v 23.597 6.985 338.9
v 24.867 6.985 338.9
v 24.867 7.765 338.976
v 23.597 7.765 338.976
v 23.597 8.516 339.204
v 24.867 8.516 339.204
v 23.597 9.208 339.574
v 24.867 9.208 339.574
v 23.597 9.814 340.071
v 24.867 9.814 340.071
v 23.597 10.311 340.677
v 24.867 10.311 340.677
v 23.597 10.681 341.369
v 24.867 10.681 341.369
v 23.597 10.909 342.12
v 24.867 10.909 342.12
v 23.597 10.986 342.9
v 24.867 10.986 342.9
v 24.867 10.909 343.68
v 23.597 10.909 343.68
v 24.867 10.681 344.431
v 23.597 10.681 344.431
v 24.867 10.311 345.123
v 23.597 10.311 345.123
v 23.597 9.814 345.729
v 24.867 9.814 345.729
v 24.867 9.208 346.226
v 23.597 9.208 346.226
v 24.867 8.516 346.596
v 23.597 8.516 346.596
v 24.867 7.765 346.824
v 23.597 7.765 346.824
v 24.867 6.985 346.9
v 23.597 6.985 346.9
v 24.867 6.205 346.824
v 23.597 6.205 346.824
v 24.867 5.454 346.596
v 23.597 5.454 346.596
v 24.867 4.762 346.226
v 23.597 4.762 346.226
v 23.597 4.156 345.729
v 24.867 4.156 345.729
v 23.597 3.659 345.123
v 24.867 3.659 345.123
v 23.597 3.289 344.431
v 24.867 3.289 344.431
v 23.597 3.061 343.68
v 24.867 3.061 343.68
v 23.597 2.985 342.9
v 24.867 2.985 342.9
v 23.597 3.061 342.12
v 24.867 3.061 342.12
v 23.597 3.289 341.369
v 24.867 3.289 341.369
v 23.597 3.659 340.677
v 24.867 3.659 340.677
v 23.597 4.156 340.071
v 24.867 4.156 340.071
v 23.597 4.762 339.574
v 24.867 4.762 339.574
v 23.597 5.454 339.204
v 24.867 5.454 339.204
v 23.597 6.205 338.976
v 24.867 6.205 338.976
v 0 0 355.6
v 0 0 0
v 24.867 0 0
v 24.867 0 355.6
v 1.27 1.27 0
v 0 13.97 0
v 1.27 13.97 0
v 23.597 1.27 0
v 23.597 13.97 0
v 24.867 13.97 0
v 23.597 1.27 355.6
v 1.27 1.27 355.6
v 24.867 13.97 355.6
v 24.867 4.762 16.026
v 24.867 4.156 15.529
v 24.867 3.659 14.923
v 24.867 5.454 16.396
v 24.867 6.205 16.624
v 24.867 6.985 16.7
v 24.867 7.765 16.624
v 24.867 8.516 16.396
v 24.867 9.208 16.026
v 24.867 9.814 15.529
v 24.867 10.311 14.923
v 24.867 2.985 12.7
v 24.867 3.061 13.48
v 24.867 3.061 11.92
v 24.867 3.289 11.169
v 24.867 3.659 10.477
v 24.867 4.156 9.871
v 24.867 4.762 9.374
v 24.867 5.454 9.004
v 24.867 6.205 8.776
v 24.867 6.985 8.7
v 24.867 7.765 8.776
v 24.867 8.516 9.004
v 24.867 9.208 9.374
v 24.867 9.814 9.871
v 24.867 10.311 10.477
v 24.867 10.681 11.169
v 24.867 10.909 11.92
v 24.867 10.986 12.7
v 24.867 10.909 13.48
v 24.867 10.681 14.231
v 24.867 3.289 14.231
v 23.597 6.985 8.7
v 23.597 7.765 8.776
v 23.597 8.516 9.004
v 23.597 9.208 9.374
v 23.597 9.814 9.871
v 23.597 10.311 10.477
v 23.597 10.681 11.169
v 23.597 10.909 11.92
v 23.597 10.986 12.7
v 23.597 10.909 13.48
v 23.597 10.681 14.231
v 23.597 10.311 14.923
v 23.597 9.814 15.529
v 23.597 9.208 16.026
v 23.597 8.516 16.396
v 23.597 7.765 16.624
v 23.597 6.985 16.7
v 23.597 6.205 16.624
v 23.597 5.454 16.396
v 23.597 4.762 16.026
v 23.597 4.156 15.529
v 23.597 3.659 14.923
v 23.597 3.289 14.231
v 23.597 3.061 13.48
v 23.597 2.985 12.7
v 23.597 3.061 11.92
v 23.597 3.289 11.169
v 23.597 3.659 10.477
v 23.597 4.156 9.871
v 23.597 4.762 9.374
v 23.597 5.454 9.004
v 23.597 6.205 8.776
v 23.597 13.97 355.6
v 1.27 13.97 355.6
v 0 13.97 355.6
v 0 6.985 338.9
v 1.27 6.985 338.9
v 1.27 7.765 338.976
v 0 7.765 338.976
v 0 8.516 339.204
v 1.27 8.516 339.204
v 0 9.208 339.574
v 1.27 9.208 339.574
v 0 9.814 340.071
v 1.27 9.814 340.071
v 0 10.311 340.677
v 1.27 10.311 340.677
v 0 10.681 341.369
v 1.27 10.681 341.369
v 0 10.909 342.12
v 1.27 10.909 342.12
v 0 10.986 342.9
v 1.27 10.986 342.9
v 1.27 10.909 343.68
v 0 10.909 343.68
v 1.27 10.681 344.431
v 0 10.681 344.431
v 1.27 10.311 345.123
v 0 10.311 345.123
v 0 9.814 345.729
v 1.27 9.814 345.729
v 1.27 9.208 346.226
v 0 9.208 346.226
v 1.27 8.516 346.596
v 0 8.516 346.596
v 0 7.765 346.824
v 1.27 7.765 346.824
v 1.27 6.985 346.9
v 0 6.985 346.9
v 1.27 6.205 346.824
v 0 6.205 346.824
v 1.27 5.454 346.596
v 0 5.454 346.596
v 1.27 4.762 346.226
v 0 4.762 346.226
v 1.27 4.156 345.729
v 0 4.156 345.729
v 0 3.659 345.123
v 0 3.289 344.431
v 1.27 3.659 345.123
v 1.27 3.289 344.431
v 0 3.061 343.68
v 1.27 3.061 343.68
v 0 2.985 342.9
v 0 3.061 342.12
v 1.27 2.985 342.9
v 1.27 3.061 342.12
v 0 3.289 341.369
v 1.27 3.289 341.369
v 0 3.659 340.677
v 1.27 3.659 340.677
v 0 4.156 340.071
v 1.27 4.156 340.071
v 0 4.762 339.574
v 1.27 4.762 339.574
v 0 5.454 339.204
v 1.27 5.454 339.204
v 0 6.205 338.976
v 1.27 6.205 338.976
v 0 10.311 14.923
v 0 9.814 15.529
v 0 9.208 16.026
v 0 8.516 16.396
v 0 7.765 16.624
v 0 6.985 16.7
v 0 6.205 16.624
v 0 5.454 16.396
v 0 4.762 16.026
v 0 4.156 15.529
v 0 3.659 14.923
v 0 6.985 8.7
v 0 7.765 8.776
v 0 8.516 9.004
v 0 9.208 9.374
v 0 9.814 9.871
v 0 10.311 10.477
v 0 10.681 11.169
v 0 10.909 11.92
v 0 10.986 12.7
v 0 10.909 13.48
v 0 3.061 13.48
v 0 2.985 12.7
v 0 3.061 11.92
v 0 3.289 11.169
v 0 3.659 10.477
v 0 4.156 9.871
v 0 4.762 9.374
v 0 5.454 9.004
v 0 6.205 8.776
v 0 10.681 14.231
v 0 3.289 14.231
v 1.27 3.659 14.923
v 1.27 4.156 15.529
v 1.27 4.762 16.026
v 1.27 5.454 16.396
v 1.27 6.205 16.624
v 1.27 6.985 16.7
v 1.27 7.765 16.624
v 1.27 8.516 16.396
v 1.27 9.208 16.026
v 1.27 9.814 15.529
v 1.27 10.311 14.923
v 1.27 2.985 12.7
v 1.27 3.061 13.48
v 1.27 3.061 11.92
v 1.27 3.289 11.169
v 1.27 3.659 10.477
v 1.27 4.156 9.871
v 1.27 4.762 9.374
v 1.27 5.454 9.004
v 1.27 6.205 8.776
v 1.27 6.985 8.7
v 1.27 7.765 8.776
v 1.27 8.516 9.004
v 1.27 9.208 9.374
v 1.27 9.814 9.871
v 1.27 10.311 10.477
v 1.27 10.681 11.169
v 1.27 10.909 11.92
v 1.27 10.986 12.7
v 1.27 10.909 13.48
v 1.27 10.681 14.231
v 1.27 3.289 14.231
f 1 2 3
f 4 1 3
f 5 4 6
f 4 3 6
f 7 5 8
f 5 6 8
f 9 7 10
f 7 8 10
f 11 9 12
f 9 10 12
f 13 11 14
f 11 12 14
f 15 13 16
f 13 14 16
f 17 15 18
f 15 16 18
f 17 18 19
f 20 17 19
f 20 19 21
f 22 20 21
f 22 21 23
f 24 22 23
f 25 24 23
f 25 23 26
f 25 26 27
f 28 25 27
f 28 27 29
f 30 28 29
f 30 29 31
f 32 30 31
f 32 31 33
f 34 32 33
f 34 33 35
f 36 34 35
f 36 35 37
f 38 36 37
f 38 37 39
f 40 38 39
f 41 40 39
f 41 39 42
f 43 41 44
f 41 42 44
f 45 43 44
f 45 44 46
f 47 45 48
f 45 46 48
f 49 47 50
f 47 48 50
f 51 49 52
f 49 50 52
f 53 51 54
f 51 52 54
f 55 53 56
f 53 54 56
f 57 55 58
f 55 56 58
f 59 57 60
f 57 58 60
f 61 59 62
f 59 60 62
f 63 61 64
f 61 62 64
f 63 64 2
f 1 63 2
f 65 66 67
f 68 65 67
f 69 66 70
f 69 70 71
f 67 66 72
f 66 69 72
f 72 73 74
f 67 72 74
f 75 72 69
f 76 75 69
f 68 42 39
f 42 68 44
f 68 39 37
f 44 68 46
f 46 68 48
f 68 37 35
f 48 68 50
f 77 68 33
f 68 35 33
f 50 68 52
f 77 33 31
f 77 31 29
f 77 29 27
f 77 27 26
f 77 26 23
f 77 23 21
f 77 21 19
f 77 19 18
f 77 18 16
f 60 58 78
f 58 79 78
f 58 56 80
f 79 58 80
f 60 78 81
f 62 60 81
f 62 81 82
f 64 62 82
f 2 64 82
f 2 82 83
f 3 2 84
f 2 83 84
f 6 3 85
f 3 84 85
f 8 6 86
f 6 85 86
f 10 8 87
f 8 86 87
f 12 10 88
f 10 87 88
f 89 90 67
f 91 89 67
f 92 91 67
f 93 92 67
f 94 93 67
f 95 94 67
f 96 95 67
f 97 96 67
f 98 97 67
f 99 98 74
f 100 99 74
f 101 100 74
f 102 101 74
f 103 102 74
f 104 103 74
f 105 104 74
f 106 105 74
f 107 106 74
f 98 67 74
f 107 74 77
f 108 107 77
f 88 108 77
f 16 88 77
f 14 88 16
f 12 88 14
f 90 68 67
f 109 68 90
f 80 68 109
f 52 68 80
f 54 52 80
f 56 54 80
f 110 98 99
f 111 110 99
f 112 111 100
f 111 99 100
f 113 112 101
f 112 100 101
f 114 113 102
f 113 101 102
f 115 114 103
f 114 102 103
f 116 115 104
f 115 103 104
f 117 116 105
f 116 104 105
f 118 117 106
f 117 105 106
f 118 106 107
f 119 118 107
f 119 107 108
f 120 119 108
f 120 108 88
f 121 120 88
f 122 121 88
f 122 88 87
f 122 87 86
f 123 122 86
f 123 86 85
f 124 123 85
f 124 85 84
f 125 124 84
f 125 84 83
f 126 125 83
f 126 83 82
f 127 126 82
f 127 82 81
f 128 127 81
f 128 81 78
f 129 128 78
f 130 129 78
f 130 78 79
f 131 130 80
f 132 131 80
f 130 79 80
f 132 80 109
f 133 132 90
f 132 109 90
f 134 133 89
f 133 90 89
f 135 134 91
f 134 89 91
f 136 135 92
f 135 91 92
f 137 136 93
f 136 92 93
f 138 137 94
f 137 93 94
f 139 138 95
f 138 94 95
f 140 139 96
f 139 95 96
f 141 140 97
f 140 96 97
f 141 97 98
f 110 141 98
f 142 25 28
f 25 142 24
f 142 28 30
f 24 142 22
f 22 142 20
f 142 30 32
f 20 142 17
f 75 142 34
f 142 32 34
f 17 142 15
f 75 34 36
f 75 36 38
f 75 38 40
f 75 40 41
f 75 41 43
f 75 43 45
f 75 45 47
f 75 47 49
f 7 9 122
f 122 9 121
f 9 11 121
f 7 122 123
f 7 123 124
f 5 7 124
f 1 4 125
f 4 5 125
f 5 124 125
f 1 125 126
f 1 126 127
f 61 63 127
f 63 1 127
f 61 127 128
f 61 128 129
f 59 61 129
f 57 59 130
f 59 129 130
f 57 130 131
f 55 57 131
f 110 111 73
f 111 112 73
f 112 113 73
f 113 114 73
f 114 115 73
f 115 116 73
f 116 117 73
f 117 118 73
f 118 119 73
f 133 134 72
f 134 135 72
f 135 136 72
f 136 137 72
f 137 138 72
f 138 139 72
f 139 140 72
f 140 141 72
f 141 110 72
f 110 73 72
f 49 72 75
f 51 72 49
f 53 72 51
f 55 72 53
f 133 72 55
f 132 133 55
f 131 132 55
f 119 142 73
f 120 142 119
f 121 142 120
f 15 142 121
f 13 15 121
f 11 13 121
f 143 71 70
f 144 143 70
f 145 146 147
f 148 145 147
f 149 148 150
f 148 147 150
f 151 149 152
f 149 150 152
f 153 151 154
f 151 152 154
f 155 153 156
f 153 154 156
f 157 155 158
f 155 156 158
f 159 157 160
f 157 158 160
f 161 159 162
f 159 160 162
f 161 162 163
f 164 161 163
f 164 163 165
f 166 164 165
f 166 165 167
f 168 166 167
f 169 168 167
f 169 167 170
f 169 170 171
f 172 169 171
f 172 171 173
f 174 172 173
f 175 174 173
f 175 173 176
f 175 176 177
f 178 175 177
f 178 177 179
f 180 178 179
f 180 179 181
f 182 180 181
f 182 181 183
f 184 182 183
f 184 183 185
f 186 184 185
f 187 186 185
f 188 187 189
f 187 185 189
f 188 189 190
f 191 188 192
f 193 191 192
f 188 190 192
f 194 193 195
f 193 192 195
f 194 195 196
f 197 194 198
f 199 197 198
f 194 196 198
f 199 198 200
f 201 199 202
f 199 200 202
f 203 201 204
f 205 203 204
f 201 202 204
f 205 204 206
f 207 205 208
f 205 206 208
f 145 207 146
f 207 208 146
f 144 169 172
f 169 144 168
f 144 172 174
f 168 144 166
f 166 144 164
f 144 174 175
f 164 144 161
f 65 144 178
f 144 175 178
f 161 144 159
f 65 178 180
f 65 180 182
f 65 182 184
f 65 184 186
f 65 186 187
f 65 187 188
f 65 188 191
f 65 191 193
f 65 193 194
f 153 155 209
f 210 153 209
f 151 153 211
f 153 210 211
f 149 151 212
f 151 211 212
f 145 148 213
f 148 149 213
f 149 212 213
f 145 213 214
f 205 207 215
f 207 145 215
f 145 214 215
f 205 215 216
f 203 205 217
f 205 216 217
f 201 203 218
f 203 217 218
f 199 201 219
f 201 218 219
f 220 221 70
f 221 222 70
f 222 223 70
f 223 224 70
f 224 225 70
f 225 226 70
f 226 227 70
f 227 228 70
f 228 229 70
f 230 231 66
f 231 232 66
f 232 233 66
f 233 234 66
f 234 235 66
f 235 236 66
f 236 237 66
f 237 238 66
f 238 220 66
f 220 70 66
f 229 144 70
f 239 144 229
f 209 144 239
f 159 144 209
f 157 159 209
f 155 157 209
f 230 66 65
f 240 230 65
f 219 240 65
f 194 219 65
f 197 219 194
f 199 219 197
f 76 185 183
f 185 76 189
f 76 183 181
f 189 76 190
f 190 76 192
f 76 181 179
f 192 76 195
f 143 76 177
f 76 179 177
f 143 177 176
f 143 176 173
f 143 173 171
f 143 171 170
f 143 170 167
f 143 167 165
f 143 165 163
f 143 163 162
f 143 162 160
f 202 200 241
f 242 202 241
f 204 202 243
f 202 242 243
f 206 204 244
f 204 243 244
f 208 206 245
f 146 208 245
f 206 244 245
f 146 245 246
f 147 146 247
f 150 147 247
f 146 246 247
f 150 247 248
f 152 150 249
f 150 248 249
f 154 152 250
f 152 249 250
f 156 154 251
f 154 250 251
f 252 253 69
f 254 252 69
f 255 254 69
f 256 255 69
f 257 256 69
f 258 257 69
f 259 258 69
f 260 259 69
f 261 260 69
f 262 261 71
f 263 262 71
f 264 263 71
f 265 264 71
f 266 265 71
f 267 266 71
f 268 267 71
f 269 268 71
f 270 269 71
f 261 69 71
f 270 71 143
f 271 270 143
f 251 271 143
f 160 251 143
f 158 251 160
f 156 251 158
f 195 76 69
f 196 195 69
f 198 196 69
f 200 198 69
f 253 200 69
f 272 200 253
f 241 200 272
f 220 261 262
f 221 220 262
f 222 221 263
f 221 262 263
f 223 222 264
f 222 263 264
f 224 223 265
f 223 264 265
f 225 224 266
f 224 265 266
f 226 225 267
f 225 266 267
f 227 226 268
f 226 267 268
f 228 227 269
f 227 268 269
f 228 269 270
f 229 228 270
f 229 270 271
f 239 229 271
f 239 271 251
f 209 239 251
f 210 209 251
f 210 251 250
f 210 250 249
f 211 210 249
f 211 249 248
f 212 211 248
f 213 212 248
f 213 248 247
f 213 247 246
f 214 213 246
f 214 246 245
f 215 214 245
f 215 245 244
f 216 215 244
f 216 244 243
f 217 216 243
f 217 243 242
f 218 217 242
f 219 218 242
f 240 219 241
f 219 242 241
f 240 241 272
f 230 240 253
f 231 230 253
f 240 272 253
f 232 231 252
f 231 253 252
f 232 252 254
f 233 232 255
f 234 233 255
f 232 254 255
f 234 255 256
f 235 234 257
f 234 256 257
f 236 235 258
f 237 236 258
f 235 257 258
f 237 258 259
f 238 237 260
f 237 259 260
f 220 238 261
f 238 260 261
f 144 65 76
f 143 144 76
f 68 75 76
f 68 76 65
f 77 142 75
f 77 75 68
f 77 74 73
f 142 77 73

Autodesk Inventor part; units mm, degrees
ref_plane "YZ Plane" through (0, 0, 0) normal (1, 0, 0) x (0, 1, 0)
ref_plane "XZ Plane" through (0, 0, 0) normal (0, 1, 0) x (-1, 0, 0)
ref_plane "XY Plane" through (0, 0, 0) normal (0, 0, 1) x (1, 0, 0)
sketch "Sketch1" plane through (0, 0, 0) normal (0, 0, 1) x (1, 0, 0)
  line L0 (0, 13.97) -> (0, 0)
  line L1 (0, 0) -> (24.8666, 0)
  line L2 (24.8666, 0) -> (24.8666, 13.97)
  line L3 (23.5966, 13.97) -> (23.5966, 1.27)
  line L4 (23.5966, 1.27) -> (1.27, 1.27)
  line L5 (1.27, 1.27) -> (1.27, 13.97)
  line L6 (24.8666, 13.97) -> (23.5966, 13.97)
  line L7 (1.27, 13.97) -> (0, 13.97)
  dimension "d0" = 24.8666
  dimension "d2" = 13.97
  dimension "d3" = 1.27
  dimension "d4" = 1.27
  dimension "d5" = 1.27
extrude "Extrusion1" add sketch "Sketch1" along normal blind 355.6
sketch "Sketch2" plane through (24.8666, 0, 0) normal (1, 0, 0) x (0, 0, -1)
  line L0 (0, 13.97) -> (0, 0) projected
  line L1 (-355.6, 0) -> (-355.6, 13.97) projected
  circle A0 centre (-342.9, 6.985) radius 4.0005
  circle A1 centre (-12.7, 6.985) radius 4.0005
  dimension "d8" = 8.001
  dimension "d9" = 8.001
  dimension "d10" = 12.7
  dimension "d11" = 12.7
extrude "Extrusion2" cut sketch "Sketch2" against normal blind 317.5 contours A1
sketch "Sketch3" plane through (24.8666, 0, 0) normal (1, 0, 0) x (0, 0, -1)
  line L0 (-355.6, 0) -> (-355.6, 13.97) projected
  circle A0 centre (-342.9, 6.985) radius 4.0005
  dimension "d14" = 8.001
  dimension "d15" = 12.7
extrude "Extrusion3" cut sketch "Sketch3" against normal blind 317.5
properties part number "U-Channel"
